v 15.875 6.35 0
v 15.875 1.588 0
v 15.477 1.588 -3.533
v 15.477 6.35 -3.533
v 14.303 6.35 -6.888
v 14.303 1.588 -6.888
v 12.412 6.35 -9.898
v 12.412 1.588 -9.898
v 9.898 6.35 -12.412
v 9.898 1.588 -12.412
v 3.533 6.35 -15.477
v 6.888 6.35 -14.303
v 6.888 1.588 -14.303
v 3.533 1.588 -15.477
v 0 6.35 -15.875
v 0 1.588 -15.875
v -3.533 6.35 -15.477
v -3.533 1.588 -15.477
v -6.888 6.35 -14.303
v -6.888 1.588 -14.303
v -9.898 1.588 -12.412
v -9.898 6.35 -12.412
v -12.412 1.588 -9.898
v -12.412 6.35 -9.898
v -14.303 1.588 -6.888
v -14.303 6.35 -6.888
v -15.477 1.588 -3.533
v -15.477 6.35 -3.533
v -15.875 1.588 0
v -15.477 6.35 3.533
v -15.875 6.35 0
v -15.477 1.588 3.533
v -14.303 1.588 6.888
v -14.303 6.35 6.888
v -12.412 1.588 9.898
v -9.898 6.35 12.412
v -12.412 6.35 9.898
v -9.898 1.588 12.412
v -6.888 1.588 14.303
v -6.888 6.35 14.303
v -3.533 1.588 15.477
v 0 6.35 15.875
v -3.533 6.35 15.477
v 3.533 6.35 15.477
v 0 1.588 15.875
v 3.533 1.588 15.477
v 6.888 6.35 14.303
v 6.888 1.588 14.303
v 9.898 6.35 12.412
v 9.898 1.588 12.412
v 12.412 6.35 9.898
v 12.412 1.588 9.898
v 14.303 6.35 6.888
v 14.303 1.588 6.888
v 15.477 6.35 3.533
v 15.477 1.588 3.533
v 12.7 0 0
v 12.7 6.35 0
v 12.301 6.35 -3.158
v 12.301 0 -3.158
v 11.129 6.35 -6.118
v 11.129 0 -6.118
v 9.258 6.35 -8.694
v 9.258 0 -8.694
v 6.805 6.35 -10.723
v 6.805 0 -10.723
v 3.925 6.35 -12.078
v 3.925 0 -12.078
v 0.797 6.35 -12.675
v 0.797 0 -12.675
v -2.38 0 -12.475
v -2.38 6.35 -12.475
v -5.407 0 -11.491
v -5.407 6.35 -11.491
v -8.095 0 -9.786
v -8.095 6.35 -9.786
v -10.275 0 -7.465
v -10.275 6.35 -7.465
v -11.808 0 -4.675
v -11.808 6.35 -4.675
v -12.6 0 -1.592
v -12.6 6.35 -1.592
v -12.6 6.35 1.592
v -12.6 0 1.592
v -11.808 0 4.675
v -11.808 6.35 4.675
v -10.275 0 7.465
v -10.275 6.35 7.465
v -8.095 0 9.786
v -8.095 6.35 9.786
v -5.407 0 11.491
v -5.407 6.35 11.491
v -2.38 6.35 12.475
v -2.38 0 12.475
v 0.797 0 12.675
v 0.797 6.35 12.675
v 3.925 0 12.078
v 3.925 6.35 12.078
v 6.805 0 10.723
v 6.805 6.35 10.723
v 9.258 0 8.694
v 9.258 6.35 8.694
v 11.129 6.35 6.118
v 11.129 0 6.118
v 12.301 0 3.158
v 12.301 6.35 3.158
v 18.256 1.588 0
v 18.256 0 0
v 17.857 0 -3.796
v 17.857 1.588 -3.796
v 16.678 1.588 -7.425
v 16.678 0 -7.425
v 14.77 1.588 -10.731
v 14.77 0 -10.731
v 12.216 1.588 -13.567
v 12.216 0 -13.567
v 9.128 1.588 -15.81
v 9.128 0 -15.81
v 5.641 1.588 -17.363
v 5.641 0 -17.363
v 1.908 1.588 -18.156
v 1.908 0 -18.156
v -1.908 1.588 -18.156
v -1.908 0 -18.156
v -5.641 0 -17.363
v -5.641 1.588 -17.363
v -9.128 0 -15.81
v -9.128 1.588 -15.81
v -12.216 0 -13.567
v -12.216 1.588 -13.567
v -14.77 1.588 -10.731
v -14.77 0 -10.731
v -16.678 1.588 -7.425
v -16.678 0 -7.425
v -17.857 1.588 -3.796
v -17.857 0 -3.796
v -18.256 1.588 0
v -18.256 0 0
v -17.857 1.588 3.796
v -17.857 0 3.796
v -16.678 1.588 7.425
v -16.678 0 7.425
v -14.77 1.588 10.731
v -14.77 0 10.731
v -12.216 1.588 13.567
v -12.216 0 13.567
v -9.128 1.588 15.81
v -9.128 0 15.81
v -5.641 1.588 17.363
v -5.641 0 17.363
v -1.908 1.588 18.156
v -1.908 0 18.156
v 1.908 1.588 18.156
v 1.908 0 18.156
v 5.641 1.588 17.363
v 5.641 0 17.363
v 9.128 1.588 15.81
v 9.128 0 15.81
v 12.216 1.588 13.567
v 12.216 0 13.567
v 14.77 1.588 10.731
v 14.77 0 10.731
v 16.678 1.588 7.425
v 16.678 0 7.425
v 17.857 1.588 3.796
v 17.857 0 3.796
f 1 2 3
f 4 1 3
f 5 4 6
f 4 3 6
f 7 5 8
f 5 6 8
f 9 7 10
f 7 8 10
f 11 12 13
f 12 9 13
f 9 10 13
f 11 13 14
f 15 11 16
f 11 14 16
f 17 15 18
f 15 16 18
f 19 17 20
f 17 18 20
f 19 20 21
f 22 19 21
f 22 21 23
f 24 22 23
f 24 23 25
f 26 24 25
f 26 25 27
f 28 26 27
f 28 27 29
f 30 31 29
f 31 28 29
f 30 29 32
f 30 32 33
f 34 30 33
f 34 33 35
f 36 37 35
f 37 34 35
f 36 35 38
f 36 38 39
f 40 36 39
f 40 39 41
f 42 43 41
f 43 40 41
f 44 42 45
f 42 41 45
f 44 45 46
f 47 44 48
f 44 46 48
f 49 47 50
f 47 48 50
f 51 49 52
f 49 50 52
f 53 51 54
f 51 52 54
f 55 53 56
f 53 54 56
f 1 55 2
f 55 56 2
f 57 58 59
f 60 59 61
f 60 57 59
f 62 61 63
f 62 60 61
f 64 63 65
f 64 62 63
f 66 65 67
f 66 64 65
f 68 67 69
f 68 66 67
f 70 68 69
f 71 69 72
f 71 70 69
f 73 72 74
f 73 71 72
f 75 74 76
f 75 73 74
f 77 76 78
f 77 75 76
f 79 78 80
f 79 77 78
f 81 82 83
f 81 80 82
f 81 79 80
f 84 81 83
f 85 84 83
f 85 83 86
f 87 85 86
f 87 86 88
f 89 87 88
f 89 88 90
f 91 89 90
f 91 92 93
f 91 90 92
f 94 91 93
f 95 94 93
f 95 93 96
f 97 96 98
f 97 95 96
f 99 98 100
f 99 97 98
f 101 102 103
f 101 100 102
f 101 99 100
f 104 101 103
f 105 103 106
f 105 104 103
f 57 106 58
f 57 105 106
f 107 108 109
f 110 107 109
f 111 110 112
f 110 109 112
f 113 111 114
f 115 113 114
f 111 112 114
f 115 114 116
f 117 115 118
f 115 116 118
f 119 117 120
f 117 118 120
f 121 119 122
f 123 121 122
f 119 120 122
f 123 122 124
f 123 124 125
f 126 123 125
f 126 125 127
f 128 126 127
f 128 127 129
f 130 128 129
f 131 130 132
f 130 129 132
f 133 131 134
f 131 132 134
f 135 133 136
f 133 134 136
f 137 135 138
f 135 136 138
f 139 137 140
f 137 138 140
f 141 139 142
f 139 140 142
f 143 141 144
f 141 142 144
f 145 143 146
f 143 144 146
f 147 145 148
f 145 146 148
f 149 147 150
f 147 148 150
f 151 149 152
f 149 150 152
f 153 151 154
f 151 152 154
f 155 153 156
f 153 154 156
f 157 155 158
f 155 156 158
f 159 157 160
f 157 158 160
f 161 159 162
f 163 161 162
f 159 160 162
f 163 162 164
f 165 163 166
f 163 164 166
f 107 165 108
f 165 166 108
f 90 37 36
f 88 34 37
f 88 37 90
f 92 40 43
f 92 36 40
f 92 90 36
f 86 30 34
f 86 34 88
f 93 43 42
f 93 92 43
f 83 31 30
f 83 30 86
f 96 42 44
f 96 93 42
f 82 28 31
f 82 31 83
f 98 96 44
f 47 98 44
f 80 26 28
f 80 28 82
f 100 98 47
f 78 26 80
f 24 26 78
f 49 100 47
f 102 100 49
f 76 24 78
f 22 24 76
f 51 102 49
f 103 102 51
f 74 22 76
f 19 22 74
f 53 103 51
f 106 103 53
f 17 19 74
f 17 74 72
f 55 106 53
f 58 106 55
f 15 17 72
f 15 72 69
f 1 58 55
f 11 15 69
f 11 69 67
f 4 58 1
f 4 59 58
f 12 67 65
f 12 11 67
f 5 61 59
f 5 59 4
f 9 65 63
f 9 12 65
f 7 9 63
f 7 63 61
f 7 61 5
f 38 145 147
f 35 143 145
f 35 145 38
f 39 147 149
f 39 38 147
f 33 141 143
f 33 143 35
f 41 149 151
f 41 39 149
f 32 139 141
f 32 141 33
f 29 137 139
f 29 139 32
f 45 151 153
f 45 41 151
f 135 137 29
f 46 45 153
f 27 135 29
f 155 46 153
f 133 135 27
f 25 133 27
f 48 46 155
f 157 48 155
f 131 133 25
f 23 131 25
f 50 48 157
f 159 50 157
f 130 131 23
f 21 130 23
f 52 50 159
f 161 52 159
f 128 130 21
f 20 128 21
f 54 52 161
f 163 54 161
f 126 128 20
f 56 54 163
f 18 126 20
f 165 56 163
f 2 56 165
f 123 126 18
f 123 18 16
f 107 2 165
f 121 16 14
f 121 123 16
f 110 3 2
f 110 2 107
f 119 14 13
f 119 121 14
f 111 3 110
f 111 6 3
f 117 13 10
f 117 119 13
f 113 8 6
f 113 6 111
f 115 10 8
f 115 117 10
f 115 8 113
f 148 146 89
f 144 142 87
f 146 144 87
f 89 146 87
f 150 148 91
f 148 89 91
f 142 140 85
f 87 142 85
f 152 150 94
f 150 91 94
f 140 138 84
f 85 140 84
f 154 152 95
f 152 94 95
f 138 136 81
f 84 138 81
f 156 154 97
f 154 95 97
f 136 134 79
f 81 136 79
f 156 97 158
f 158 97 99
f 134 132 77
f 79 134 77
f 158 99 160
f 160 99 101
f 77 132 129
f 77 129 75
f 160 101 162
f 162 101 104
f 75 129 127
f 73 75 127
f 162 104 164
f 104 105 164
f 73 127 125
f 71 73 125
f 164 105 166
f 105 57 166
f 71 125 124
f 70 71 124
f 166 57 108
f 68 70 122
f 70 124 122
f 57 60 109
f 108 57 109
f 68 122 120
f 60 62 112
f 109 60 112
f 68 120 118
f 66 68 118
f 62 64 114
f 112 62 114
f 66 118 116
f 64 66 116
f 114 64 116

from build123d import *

# Parameters (mm, degrees)
SKETCH2_R           = 15.875
SKETCH2_R_2         = 12.7
BOSS_EXTRUDE1_DEPTH = 25.4
SKETCH3_R           = 18.25625
SKETCH3_R_2         = 15.875
BOSS_EXTRUDE2_DEPTH = 1.5875
SKETCH5_R           = 18.25625
CUT_EXTRUDE1_DEPTH  = 19.05


with BuildPart() as part:
    # Sketch2 → Boss-Extrude1 (new body)
    with BuildSketch(Plane(origin=(0, 0, 0), x_dir=(1, 0, 0), z_dir=(0, 1, 0))):
        Circle(SKETCH2_R)
        Circle(SKETCH2_R_2, mode=Mode.SUBTRACT)
    extrude(amount=BOSS_EXTRUDE1_DEPTH)

    # Sketch3 → Boss-Extrude2 (add)
    with BuildSketch(Plane(origin=(0, 0, 0), x_dir=(1, 0, 0), z_dir=(0, 1, 0))):
        Circle(SKETCH3_R)
        Circle(SKETCH3_R_2, mode=Mode.SUBTRACT)
    extrude(amount=BOSS_EXTRUDE2_DEPTH)

    # Sketch5 → Cut-Extrude1 (cut)
    with BuildSketch(Plane(origin=(0, 25.4, 0), x_dir=(1, 0, 0), z_dir=(0, 1, 0))):
        Circle(SKETCH5_R)
    extrude(amount=-CUT_EXTRUDE1_DEPTH, mode=Mode.SUBTRACT)


solid = part.part
